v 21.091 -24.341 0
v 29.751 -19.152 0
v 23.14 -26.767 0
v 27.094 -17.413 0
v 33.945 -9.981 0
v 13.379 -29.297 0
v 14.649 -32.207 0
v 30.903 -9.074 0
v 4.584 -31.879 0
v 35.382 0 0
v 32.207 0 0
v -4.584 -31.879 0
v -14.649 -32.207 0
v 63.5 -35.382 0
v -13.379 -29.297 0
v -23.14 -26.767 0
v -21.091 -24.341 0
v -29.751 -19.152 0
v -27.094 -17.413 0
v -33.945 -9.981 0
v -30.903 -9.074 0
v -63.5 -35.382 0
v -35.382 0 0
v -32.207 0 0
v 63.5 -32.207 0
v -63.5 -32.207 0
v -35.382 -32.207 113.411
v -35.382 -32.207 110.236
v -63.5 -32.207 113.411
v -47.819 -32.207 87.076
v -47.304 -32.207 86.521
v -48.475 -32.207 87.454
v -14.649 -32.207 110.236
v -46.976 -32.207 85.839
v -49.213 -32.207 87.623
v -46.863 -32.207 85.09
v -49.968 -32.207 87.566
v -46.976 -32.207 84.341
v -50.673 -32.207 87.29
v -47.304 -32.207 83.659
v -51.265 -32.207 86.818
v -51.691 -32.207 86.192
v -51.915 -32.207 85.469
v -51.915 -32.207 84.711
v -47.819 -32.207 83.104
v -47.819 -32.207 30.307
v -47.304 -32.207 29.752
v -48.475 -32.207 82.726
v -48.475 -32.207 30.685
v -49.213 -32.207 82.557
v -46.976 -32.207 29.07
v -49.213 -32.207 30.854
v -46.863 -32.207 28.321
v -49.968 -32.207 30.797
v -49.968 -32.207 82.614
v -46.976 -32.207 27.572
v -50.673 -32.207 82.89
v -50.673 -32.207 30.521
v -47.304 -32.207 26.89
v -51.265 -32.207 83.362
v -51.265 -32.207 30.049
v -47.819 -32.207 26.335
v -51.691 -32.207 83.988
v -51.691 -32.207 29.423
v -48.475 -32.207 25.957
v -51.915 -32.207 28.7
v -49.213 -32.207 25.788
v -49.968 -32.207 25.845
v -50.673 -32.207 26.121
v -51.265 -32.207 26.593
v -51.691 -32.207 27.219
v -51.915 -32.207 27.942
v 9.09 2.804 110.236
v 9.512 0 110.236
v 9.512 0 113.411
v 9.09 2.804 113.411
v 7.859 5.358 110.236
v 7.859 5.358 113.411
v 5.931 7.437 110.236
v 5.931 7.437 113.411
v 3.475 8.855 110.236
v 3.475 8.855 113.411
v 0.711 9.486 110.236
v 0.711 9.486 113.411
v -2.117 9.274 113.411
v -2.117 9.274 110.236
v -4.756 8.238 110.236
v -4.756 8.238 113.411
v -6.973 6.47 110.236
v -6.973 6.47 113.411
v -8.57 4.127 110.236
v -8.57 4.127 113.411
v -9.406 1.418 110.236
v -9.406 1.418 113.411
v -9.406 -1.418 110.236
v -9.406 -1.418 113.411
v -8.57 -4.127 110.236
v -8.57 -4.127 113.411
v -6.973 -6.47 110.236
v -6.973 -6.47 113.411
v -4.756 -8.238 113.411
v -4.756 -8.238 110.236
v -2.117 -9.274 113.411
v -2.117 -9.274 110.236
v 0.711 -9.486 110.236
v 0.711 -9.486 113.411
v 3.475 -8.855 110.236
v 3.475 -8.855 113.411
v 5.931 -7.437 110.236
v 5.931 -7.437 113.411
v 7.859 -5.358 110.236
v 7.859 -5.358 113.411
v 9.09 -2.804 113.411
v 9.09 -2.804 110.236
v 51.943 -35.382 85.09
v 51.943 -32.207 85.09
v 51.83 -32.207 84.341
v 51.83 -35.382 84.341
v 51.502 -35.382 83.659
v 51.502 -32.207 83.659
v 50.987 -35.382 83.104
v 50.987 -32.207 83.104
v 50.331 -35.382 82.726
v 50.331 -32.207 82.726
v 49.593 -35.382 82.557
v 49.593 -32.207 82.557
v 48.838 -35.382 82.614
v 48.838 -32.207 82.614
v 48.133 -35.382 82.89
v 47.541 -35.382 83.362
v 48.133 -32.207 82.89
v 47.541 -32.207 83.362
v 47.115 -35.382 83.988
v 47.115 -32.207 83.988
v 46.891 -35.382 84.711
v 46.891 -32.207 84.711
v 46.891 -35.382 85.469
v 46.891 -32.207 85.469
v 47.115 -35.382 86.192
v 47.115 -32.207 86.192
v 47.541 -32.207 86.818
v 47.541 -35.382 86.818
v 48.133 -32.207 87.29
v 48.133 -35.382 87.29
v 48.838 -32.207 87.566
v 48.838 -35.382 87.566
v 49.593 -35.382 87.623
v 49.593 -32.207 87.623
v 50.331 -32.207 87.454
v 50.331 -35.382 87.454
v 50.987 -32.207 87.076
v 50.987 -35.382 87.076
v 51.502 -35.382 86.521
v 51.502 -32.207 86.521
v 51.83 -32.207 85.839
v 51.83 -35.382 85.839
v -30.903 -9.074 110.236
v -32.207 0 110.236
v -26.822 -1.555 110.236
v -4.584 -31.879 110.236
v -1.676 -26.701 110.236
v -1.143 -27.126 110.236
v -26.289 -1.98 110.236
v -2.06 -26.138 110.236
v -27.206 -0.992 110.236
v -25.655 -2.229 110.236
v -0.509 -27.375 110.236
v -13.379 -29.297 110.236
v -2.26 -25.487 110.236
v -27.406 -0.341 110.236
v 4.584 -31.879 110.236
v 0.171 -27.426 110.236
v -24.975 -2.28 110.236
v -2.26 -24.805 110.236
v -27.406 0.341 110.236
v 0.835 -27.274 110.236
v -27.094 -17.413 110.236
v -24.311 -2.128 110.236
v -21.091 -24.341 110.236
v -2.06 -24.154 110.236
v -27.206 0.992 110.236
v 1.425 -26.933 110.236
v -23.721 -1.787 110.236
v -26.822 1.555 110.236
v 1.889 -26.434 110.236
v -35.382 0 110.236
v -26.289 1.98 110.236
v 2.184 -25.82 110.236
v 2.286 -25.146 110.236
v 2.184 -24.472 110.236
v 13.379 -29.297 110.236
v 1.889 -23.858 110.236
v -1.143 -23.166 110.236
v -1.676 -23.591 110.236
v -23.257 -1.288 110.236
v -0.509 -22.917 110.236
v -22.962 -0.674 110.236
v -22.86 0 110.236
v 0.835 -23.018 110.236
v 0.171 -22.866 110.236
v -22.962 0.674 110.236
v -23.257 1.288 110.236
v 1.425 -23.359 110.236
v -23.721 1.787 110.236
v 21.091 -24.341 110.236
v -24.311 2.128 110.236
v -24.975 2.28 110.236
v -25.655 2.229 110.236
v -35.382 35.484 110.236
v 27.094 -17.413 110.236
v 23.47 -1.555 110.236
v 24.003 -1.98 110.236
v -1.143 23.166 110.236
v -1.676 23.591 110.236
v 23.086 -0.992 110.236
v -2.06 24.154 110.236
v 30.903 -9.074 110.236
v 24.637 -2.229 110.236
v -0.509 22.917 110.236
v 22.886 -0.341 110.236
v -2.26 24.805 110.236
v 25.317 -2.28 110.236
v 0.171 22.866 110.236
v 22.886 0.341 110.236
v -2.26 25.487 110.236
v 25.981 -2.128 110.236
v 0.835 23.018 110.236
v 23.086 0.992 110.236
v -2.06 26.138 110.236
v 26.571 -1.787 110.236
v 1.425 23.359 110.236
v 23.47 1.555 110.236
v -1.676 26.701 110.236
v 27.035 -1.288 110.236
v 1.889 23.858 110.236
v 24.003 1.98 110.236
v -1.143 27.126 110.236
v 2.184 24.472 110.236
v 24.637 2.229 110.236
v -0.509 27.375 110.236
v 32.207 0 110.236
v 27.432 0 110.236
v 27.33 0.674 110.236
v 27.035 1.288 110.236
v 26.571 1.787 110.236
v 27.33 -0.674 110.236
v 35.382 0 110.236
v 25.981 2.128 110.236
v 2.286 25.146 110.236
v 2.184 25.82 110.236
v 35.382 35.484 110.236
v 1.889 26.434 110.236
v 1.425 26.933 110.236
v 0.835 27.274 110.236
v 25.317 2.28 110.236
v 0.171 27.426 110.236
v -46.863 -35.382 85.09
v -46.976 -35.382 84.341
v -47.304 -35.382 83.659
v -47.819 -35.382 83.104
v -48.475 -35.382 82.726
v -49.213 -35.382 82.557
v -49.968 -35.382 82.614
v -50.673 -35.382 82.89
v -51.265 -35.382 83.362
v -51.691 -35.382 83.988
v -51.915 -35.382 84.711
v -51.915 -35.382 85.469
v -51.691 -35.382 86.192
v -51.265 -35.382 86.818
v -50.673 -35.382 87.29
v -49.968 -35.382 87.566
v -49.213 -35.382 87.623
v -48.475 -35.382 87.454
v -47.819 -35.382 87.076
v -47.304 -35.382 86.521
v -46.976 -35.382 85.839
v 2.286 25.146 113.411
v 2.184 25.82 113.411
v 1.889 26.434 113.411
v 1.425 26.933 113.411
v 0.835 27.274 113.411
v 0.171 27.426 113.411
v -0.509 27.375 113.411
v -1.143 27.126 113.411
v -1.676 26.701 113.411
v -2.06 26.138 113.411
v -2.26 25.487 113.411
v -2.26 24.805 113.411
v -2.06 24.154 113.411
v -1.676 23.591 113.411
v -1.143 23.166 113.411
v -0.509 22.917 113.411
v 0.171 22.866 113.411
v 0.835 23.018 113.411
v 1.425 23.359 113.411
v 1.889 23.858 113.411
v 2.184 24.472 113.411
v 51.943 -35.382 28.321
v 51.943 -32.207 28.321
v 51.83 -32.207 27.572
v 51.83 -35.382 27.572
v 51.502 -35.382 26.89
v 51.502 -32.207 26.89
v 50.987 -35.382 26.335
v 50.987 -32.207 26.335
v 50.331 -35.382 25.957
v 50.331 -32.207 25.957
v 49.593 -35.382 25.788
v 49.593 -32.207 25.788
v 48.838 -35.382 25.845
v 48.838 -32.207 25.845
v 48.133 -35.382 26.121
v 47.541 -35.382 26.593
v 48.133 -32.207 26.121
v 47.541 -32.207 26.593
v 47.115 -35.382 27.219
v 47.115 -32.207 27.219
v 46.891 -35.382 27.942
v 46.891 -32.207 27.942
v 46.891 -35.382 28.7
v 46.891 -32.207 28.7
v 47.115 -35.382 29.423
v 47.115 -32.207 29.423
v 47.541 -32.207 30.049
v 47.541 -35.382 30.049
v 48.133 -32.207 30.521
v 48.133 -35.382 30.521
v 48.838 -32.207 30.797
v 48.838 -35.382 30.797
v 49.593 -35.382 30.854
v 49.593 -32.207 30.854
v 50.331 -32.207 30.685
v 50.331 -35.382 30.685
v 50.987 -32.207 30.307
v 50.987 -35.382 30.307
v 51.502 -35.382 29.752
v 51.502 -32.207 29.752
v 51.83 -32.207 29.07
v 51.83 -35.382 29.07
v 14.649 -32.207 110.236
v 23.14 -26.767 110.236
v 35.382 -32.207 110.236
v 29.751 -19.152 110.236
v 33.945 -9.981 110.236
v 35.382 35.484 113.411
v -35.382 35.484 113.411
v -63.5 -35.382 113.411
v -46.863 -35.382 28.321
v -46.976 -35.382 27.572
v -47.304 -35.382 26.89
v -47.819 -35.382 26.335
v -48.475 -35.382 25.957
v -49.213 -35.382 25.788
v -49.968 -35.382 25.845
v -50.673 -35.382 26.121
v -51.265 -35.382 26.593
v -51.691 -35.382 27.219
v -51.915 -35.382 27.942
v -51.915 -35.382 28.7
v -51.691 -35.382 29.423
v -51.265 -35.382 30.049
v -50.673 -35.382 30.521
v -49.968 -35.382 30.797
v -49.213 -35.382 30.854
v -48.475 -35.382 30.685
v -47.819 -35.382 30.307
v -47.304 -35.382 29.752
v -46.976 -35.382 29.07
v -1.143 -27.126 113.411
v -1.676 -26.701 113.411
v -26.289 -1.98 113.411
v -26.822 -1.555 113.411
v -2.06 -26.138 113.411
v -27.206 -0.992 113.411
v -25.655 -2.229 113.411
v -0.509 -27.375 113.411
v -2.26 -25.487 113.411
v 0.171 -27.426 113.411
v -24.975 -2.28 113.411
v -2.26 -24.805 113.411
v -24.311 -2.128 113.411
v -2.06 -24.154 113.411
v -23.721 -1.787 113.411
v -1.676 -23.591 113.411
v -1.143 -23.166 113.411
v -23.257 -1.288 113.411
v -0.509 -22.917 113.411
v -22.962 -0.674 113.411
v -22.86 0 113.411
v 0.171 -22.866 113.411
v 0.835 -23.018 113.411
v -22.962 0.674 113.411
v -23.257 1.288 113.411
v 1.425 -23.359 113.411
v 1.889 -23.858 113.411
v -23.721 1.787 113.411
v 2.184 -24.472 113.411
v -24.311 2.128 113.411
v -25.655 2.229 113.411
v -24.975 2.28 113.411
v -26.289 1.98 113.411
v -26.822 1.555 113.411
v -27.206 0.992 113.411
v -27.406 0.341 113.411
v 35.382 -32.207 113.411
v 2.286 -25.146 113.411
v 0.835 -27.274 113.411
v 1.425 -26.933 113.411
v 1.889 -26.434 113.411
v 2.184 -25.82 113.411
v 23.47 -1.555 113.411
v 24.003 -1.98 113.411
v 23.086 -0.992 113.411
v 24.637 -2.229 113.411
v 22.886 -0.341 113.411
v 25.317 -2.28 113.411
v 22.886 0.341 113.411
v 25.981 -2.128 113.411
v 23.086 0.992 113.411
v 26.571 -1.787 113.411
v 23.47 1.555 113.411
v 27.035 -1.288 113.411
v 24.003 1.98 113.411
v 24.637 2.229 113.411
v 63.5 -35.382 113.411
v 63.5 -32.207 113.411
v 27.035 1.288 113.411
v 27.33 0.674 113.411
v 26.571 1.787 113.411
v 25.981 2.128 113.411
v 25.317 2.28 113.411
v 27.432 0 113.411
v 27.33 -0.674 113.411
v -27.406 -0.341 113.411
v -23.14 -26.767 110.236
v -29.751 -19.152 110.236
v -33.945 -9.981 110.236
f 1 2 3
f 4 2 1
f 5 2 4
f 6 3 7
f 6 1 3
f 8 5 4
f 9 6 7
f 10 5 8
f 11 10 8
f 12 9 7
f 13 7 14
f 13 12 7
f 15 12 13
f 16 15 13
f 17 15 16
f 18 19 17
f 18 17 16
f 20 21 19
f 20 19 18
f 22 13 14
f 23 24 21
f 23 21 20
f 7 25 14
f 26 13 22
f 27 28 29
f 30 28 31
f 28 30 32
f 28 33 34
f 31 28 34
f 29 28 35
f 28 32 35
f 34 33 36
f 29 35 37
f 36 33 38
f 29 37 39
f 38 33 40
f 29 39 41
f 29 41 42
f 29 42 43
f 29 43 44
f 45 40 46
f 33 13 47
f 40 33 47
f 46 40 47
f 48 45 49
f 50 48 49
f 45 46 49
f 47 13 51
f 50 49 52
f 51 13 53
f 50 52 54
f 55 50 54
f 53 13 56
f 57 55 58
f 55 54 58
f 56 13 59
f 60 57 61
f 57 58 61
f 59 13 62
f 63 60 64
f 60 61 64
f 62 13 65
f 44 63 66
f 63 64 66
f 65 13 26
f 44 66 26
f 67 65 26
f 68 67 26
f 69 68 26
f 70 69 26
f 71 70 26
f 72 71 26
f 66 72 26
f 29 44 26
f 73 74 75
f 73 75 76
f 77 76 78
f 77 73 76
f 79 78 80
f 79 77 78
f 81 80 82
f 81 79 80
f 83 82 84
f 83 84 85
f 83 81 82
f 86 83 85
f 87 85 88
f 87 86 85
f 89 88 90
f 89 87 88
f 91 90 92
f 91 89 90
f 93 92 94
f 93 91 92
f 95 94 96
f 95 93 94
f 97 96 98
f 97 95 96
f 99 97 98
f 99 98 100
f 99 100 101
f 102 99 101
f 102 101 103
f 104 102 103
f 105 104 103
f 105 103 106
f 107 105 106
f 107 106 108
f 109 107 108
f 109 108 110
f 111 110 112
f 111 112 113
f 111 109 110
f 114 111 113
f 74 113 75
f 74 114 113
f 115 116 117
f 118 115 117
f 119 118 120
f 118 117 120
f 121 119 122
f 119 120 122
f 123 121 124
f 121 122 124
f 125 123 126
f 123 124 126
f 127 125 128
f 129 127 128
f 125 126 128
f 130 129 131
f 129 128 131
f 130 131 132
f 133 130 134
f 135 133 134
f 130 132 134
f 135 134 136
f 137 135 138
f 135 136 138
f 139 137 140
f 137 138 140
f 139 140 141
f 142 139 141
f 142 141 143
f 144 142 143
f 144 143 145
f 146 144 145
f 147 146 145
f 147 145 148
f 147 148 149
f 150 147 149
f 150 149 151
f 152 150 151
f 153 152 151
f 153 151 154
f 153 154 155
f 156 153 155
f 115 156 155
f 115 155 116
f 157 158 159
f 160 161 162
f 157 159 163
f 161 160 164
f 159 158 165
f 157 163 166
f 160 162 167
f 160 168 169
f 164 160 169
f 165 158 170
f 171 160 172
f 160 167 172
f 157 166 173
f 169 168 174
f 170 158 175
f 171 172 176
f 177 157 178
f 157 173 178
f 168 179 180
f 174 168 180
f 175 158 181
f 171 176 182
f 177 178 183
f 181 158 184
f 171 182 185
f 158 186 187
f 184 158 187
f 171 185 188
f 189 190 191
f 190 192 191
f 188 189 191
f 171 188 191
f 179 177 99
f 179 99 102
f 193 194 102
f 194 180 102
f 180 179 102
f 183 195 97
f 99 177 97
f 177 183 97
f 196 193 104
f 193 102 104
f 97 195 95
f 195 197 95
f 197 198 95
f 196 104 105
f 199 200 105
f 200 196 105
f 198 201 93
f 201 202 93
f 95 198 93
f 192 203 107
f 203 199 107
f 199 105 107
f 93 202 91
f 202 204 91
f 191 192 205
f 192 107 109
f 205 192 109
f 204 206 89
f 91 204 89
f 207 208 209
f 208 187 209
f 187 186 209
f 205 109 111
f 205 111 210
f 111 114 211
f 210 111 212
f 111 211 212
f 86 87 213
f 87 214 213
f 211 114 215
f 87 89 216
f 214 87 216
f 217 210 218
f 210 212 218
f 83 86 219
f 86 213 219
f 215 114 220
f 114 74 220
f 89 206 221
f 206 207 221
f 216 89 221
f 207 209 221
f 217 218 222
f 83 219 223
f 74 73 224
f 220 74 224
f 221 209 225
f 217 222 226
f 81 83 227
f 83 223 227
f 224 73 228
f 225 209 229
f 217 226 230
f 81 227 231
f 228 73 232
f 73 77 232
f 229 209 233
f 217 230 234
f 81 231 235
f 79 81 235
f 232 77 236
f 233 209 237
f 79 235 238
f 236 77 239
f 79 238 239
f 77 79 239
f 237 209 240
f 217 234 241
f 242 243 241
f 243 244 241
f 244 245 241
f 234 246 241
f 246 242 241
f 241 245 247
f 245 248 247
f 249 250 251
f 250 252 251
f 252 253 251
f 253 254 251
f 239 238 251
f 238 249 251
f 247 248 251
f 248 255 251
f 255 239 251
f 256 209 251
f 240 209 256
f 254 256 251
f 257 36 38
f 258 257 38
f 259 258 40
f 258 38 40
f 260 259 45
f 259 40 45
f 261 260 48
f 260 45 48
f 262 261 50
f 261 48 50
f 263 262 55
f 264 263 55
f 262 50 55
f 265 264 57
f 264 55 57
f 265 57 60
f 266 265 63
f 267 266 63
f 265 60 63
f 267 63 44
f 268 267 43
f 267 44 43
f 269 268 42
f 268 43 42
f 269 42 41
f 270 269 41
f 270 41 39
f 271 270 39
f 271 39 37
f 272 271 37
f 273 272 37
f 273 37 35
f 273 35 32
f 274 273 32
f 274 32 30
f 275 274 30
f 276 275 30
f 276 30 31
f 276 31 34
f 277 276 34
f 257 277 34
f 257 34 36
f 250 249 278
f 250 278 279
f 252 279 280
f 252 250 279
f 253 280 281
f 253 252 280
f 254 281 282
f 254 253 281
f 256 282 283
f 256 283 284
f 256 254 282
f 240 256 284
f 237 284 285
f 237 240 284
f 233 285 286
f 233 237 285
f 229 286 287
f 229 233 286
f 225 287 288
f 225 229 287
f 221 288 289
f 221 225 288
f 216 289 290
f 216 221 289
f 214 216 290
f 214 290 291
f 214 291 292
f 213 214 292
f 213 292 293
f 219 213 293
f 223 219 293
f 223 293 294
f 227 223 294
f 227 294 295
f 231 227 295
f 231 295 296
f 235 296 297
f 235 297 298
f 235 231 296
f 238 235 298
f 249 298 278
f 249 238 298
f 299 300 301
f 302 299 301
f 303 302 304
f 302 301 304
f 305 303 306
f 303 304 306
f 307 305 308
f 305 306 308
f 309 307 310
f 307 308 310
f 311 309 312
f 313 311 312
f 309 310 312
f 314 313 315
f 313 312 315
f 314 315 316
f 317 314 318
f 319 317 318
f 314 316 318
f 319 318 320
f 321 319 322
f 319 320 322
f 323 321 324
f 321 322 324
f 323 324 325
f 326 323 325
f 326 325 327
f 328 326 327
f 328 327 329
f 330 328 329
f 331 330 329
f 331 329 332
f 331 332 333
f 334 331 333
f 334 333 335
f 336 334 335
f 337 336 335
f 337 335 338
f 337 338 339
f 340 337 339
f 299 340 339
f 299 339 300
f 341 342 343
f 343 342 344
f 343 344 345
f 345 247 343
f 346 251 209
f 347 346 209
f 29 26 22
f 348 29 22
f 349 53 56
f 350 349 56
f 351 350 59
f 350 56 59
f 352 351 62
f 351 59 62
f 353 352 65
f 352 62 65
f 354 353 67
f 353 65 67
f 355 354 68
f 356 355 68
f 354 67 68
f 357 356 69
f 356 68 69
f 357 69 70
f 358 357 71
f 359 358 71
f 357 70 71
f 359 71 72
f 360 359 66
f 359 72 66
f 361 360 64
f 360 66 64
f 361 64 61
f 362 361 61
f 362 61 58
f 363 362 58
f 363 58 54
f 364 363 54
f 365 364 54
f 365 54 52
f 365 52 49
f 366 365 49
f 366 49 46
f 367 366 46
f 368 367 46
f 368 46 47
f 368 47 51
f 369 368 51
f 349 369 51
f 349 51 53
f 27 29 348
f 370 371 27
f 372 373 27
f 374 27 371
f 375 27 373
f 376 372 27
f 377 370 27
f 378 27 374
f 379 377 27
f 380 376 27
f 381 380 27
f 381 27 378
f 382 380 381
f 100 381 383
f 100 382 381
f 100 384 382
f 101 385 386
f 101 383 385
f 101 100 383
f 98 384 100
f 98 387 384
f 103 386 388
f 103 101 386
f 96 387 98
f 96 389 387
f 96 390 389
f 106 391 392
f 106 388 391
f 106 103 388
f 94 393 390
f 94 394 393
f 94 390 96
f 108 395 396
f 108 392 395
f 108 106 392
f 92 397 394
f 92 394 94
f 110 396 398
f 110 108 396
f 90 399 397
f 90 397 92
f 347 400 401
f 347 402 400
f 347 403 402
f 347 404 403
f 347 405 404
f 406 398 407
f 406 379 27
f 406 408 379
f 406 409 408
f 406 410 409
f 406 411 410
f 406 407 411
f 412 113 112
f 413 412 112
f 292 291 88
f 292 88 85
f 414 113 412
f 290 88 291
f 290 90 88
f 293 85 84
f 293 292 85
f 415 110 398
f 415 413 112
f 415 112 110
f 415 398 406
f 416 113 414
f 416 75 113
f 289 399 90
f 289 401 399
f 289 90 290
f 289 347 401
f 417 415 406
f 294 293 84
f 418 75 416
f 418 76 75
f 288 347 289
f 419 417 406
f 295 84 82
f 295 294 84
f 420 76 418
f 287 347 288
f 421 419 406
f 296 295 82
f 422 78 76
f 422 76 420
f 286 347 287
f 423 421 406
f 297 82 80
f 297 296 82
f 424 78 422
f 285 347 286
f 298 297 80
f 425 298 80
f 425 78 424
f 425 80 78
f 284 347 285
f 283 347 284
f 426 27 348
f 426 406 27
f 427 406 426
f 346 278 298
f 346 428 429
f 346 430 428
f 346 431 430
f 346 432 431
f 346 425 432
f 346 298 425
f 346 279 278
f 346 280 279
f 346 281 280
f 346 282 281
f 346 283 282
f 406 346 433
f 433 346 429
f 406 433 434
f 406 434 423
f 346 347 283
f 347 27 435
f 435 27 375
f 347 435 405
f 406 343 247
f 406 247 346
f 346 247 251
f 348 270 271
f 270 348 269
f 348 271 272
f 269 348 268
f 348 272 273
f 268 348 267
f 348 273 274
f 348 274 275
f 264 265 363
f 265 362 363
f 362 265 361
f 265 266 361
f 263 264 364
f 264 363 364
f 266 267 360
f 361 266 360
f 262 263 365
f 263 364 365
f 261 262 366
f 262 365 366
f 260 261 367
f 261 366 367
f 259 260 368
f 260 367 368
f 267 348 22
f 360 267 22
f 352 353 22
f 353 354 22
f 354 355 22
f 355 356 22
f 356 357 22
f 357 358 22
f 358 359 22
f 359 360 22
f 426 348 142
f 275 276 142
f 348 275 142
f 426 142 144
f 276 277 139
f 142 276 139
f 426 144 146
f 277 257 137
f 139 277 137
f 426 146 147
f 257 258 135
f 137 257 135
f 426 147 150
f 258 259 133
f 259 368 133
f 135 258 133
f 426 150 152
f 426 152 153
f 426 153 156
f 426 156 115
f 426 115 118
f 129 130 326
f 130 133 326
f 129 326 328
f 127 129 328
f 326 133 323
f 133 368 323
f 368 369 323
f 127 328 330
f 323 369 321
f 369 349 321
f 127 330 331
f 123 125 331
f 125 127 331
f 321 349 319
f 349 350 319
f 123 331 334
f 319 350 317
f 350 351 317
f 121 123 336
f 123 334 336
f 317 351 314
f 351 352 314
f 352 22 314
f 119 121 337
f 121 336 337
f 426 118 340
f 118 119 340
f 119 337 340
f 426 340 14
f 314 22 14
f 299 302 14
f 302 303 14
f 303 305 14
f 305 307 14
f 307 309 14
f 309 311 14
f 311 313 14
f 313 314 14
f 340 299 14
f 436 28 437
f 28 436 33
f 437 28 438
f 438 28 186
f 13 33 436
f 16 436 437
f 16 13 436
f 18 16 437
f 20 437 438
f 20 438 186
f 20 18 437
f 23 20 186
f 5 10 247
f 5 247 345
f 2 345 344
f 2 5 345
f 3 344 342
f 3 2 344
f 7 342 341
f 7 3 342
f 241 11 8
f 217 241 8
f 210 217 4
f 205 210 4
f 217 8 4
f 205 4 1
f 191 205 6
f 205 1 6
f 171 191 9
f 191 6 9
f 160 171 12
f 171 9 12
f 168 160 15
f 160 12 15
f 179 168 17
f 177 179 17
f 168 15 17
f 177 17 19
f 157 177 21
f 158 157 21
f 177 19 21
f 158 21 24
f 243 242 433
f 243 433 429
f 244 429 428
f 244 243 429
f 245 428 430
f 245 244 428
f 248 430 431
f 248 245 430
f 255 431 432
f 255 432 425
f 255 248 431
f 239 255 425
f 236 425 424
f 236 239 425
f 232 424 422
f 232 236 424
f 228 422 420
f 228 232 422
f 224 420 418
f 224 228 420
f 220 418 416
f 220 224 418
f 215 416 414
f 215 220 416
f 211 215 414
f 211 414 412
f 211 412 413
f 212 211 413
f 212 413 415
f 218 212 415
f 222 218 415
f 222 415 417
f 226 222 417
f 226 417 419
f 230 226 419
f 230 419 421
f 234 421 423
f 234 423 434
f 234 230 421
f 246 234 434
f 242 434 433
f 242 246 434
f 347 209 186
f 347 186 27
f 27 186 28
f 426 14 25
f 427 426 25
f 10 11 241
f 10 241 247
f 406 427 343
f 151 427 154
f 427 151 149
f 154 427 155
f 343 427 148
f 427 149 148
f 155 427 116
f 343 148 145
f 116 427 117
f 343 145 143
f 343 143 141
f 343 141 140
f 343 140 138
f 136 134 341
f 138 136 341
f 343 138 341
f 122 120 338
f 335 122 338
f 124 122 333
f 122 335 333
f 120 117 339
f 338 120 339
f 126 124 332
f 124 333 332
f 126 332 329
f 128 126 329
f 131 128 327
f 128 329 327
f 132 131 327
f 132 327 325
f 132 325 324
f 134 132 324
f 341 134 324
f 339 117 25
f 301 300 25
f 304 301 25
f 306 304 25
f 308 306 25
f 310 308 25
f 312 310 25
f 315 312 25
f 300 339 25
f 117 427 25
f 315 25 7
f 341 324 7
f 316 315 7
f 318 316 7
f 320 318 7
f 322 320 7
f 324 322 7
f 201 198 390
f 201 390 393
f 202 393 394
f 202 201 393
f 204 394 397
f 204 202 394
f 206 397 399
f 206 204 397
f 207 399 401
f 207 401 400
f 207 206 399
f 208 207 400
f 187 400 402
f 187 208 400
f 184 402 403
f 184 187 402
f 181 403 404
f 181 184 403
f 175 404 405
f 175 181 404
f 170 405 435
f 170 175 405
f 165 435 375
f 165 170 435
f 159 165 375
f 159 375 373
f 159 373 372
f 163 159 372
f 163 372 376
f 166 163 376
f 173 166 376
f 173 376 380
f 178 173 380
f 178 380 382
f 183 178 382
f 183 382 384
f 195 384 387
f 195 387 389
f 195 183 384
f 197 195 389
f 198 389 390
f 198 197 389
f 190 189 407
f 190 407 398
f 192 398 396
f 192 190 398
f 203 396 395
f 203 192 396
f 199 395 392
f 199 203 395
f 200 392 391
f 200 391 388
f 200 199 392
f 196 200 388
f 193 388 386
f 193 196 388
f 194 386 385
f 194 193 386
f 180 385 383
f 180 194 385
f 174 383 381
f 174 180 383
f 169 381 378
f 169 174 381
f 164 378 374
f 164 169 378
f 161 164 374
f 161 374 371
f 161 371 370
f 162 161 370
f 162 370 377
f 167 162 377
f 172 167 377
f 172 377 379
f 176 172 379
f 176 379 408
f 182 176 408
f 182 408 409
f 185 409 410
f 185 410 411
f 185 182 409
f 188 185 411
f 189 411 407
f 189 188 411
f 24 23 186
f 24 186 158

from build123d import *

# Parameters (mm, degrees)
SKETCH1_W           = 127
SKETCH1_H           = 3.175
BOSS_EXTRUDE2_DEPTH = 110.236
SKETCH2_R           = 2.286
SKETCH2_R_2         = 9.5123
BOSS_EXTRUDE3_DEPTH = 3.175
SKETCH3_R           = 2.54
CUT_EXTRUDE1_DEPTH  = 4.175


with BuildPart() as part:
    # Sketch1 → Boss-Extrude2 (new body)
    with BuildSketch(Plane.XY):
        with BuildLine():
            Line((-35.3822, 0), (-32.2072, 0))
            ThreePointArc((-32.2072, 0), (0, -32.2072), (32.2072, 0))
            Line((32.2072, 0), (35.3822, 0))
            ThreePointArc((35.3822, 0), (0, -35.3822), (-35.3822, 0))
        make_face()
        with Locations((0, -33.7947)):
            Rectangle(SKETCH1_W, SKETCH1_H)
    extrude(amount=BOSS_EXTRUDE2_DEPTH)

    # Sketch2 → Boss-Extrude3 (add)
    with BuildSketch(Plane.XY.offset(110.236)):
        Polygon((-35.3822, -35.3822), (35.3822, -35.3822), (63.5, -35.3822), (63.5, -32.2072), (35.3822, -32.2072), (35.3822, 35.4838), (-35.3822, 35.4838), (-35.3822, -32.2072), (-63.5, -32.2072), (-63.5, -35.3822), align=None)
        with Locations((-25.146, 0)):
            Circle(SKETCH2_R, mode=Mode.SUBTRACT)
        with Locations((0, 25.146)):
            Circle(SKETCH2_R, mode=Mode.SUBTRACT)
        with Locations((25.146, 0)):
            Circle(SKETCH2_R, mode=Mode.SUBTRACT)
        with Locations((0, -25.146)):
            Circle(SKETCH2_R, mode=Mode.SUBTRACT)
        Circle(SKETCH2_R_2, mode=Mode.SUBTRACT)
    extrude(amount=BOSS_EXTRUDE3_DEPTH)

    # Sketch3 → Cut-Extrude1 (cut, through all)
    with BuildSketch(Plane(origin=(0, -32.2072, 0), x_dir=(1, 0, 0), z_dir=(0, 1, 0))):
        with Locations((49.403, -85.09)):
            Circle(SKETCH3_R)
        with Locations((49.403, -28.321)):
            Circle(SKETCH3_R)
        with Locations((-49.403, -85.09)):
            Circle(SKETCH3_R)
        with Locations((-49.403, -28.321)):
            Circle(SKETCH3_R)
    extrude(amount=-CUT_EXTRUDE1_DEPTH, mode=Mode.SUBTRACT)


solid = part.part
